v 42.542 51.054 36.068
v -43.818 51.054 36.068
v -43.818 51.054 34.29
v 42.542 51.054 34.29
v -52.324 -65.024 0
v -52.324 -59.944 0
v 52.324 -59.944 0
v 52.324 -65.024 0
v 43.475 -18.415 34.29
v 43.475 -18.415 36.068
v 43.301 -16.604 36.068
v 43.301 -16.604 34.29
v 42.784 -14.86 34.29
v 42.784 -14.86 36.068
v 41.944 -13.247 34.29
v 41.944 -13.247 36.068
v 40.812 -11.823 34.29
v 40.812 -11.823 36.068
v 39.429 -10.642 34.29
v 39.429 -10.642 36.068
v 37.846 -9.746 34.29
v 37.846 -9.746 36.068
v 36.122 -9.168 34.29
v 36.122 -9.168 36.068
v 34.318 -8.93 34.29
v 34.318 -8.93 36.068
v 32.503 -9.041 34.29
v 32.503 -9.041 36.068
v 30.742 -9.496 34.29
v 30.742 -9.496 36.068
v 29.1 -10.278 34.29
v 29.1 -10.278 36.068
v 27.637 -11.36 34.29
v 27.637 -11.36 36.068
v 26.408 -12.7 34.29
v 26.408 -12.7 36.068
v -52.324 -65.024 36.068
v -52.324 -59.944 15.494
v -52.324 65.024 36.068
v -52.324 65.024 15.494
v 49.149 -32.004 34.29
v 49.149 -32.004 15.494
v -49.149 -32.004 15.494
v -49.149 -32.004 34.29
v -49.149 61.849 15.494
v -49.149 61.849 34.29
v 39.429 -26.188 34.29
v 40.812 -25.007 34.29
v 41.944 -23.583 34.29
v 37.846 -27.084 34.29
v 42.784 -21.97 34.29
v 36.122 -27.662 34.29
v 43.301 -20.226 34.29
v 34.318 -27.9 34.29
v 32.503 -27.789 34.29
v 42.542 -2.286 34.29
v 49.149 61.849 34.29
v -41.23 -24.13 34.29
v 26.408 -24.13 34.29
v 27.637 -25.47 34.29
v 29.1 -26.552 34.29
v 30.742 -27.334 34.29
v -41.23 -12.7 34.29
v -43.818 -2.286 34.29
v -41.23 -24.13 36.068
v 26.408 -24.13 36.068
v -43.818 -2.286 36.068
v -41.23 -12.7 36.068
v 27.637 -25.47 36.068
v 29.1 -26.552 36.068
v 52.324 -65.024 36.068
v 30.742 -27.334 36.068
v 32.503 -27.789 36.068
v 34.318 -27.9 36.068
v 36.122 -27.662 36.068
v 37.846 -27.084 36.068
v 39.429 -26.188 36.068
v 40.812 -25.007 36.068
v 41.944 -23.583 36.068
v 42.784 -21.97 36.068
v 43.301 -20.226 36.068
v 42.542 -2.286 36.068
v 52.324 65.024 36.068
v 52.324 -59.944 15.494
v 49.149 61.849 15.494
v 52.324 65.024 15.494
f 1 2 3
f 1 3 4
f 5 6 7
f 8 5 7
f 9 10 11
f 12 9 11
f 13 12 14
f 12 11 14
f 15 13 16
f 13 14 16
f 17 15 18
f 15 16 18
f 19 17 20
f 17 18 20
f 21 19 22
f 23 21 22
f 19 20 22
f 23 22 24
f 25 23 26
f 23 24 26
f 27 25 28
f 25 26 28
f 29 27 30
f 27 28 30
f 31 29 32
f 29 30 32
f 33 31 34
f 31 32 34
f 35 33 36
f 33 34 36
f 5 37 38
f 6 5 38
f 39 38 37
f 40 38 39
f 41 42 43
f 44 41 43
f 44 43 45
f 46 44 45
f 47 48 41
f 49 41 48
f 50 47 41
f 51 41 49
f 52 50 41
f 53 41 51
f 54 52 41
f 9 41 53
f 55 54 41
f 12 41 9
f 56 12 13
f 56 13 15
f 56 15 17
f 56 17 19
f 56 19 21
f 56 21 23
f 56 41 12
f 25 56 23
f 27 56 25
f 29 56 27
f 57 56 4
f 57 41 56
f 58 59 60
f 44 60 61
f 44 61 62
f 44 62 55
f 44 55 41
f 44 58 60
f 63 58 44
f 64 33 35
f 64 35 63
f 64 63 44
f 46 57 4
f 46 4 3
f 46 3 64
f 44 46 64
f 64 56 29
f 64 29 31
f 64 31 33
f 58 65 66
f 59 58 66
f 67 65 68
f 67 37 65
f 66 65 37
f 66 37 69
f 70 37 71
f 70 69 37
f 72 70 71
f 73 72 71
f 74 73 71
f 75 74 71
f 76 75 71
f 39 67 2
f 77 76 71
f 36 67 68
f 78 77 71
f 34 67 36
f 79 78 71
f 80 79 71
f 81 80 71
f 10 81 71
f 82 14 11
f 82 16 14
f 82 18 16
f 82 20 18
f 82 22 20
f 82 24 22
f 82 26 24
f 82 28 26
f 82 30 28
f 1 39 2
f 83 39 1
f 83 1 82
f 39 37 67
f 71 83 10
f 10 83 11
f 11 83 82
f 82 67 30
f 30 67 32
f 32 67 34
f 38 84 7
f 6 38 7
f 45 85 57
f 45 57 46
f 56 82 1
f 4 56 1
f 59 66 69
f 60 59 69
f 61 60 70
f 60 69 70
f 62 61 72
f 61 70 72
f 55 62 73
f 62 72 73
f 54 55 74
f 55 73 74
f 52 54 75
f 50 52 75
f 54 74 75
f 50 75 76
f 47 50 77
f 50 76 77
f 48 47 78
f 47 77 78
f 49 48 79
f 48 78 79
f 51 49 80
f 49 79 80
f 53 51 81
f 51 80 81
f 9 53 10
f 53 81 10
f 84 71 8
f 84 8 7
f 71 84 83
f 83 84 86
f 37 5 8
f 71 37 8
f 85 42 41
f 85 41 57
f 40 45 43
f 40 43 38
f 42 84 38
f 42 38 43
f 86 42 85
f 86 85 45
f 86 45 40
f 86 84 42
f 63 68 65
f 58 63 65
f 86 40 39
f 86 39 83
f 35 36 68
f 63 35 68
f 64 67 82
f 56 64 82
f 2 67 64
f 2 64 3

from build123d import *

# Parameters (mm, degrees)
SKETCH1_W           = 104.648
SKETCH1_H           = 130.048
BOSS_EXTRUDE1_DEPTH = 36.068
SKETCH2_W           = 15.494
SKETCH2_H           = 124.968
CUT_EXTRUDE1_DEPTH  = 129.375329032
SKETCH3_W           = 98.298
SKETCH3_H           = 93.853
CUT_EXTRUDE2_DEPTH  = 18.796
SKETCH4_W           = 86.36
SKETCH4_H           = 53.34
CUT_EXTRUDE3_DEPTH  = 18.796
CUT_EXTRUDE4_DEPTH  = 18.796


with BuildPart() as part:
    # Sketch1 → Boss-Extrude1 (new body)
    with BuildSketch(Plane.XY):
        Rectangle(SKETCH1_W, SKETCH1_H)
    extrude(amount=BOSS_EXTRUDE1_DEPTH)

    # Sketch2 → Cut-Extrude1 (cut, through all)
    with BuildSketch(Plane(origin=(52.324, 0, 0), x_dir=(0, 0, -1), z_dir=(1, 0, 0))):
        with Locations((-7.747, 2.54)):
            Rectangle(SKETCH2_W, SKETCH2_H)
    extrude(amount=-CUT_EXTRUDE1_DEPTH, mode=Mode.SUBTRACT)

    # Sketch3 → Cut-Extrude2 (cut)
    with BuildSketch(Plane(origin=(0, 0, 15.494), x_dir=(-1, 0, 0), z_dir=(0, 0, -1))):
        with Locations((0, 14.9225)):
            Rectangle(SKETCH3_W, SKETCH3_H)
    extrude(amount=-CUT_EXTRUDE2_DEPTH, mode=Mode.SUBTRACT)

    # Sketch4 → Cut-Extrude3 (cut)
    with BuildSketch(Plane.XY.offset(36.068)):
        with Locations((-0.637536215, 24.384)):
            Rectangle(SKETCH4_W, SKETCH4_H)
    extrude(amount=-CUT_EXTRUDE3_DEPTH, mode=Mode.SUBTRACT)

    # Sketch5 → Cut-Extrude4 (cut)
    with BuildSketch(Plane.XY.offset(36.068)):
        with BuildLine():
            ThreePointArc((43.47484815, -18.415), (36.997914828, -9.415751935), (26.407785194, -12.7))
            Line((26.407785194, -12.7), (40.558113562, -12.7))
            Line((40.558113562, -12.7), (40.558113562, -24.13))
            Line((40.558113562, -24.13), (26.407785194, -24.13))
            ThreePointArc((26.407785194, -24.13), (36.997914828, -27.414248065), (43.47484815, -18.415))
        make_face()
        with BuildLine():
            Line((40.558113562, -12.7), (26.407785194, -12.7))
            ThreePointArc((26.407785194, -12.7), (24.494085978, -18.415), (26.407785194, -24.13))
            Line((26.407785194, -24.13), (40.558113562, -24.13))
            Line((40.558113562, -24.13), (40.558113562, -12.7))
        make_face()
        with BuildLine():
            Line((26.407785194, -12.7), (-41.229886438, -12.7))
            Line((-41.229886438, -12.7), (-41.229886438, -24.13))
            Line((-41.229886438, -24.13), (26.407785194, -24.13))
            ThreePointArc((26.407785194, -24.13), (24.494085978, -18.415), (26.407785194, -12.7))
        make_face()
    extrude(amount=-CUT_EXTRUDE4_DEPTH, mode=Mode.SUBTRACT)


solid = part.part
